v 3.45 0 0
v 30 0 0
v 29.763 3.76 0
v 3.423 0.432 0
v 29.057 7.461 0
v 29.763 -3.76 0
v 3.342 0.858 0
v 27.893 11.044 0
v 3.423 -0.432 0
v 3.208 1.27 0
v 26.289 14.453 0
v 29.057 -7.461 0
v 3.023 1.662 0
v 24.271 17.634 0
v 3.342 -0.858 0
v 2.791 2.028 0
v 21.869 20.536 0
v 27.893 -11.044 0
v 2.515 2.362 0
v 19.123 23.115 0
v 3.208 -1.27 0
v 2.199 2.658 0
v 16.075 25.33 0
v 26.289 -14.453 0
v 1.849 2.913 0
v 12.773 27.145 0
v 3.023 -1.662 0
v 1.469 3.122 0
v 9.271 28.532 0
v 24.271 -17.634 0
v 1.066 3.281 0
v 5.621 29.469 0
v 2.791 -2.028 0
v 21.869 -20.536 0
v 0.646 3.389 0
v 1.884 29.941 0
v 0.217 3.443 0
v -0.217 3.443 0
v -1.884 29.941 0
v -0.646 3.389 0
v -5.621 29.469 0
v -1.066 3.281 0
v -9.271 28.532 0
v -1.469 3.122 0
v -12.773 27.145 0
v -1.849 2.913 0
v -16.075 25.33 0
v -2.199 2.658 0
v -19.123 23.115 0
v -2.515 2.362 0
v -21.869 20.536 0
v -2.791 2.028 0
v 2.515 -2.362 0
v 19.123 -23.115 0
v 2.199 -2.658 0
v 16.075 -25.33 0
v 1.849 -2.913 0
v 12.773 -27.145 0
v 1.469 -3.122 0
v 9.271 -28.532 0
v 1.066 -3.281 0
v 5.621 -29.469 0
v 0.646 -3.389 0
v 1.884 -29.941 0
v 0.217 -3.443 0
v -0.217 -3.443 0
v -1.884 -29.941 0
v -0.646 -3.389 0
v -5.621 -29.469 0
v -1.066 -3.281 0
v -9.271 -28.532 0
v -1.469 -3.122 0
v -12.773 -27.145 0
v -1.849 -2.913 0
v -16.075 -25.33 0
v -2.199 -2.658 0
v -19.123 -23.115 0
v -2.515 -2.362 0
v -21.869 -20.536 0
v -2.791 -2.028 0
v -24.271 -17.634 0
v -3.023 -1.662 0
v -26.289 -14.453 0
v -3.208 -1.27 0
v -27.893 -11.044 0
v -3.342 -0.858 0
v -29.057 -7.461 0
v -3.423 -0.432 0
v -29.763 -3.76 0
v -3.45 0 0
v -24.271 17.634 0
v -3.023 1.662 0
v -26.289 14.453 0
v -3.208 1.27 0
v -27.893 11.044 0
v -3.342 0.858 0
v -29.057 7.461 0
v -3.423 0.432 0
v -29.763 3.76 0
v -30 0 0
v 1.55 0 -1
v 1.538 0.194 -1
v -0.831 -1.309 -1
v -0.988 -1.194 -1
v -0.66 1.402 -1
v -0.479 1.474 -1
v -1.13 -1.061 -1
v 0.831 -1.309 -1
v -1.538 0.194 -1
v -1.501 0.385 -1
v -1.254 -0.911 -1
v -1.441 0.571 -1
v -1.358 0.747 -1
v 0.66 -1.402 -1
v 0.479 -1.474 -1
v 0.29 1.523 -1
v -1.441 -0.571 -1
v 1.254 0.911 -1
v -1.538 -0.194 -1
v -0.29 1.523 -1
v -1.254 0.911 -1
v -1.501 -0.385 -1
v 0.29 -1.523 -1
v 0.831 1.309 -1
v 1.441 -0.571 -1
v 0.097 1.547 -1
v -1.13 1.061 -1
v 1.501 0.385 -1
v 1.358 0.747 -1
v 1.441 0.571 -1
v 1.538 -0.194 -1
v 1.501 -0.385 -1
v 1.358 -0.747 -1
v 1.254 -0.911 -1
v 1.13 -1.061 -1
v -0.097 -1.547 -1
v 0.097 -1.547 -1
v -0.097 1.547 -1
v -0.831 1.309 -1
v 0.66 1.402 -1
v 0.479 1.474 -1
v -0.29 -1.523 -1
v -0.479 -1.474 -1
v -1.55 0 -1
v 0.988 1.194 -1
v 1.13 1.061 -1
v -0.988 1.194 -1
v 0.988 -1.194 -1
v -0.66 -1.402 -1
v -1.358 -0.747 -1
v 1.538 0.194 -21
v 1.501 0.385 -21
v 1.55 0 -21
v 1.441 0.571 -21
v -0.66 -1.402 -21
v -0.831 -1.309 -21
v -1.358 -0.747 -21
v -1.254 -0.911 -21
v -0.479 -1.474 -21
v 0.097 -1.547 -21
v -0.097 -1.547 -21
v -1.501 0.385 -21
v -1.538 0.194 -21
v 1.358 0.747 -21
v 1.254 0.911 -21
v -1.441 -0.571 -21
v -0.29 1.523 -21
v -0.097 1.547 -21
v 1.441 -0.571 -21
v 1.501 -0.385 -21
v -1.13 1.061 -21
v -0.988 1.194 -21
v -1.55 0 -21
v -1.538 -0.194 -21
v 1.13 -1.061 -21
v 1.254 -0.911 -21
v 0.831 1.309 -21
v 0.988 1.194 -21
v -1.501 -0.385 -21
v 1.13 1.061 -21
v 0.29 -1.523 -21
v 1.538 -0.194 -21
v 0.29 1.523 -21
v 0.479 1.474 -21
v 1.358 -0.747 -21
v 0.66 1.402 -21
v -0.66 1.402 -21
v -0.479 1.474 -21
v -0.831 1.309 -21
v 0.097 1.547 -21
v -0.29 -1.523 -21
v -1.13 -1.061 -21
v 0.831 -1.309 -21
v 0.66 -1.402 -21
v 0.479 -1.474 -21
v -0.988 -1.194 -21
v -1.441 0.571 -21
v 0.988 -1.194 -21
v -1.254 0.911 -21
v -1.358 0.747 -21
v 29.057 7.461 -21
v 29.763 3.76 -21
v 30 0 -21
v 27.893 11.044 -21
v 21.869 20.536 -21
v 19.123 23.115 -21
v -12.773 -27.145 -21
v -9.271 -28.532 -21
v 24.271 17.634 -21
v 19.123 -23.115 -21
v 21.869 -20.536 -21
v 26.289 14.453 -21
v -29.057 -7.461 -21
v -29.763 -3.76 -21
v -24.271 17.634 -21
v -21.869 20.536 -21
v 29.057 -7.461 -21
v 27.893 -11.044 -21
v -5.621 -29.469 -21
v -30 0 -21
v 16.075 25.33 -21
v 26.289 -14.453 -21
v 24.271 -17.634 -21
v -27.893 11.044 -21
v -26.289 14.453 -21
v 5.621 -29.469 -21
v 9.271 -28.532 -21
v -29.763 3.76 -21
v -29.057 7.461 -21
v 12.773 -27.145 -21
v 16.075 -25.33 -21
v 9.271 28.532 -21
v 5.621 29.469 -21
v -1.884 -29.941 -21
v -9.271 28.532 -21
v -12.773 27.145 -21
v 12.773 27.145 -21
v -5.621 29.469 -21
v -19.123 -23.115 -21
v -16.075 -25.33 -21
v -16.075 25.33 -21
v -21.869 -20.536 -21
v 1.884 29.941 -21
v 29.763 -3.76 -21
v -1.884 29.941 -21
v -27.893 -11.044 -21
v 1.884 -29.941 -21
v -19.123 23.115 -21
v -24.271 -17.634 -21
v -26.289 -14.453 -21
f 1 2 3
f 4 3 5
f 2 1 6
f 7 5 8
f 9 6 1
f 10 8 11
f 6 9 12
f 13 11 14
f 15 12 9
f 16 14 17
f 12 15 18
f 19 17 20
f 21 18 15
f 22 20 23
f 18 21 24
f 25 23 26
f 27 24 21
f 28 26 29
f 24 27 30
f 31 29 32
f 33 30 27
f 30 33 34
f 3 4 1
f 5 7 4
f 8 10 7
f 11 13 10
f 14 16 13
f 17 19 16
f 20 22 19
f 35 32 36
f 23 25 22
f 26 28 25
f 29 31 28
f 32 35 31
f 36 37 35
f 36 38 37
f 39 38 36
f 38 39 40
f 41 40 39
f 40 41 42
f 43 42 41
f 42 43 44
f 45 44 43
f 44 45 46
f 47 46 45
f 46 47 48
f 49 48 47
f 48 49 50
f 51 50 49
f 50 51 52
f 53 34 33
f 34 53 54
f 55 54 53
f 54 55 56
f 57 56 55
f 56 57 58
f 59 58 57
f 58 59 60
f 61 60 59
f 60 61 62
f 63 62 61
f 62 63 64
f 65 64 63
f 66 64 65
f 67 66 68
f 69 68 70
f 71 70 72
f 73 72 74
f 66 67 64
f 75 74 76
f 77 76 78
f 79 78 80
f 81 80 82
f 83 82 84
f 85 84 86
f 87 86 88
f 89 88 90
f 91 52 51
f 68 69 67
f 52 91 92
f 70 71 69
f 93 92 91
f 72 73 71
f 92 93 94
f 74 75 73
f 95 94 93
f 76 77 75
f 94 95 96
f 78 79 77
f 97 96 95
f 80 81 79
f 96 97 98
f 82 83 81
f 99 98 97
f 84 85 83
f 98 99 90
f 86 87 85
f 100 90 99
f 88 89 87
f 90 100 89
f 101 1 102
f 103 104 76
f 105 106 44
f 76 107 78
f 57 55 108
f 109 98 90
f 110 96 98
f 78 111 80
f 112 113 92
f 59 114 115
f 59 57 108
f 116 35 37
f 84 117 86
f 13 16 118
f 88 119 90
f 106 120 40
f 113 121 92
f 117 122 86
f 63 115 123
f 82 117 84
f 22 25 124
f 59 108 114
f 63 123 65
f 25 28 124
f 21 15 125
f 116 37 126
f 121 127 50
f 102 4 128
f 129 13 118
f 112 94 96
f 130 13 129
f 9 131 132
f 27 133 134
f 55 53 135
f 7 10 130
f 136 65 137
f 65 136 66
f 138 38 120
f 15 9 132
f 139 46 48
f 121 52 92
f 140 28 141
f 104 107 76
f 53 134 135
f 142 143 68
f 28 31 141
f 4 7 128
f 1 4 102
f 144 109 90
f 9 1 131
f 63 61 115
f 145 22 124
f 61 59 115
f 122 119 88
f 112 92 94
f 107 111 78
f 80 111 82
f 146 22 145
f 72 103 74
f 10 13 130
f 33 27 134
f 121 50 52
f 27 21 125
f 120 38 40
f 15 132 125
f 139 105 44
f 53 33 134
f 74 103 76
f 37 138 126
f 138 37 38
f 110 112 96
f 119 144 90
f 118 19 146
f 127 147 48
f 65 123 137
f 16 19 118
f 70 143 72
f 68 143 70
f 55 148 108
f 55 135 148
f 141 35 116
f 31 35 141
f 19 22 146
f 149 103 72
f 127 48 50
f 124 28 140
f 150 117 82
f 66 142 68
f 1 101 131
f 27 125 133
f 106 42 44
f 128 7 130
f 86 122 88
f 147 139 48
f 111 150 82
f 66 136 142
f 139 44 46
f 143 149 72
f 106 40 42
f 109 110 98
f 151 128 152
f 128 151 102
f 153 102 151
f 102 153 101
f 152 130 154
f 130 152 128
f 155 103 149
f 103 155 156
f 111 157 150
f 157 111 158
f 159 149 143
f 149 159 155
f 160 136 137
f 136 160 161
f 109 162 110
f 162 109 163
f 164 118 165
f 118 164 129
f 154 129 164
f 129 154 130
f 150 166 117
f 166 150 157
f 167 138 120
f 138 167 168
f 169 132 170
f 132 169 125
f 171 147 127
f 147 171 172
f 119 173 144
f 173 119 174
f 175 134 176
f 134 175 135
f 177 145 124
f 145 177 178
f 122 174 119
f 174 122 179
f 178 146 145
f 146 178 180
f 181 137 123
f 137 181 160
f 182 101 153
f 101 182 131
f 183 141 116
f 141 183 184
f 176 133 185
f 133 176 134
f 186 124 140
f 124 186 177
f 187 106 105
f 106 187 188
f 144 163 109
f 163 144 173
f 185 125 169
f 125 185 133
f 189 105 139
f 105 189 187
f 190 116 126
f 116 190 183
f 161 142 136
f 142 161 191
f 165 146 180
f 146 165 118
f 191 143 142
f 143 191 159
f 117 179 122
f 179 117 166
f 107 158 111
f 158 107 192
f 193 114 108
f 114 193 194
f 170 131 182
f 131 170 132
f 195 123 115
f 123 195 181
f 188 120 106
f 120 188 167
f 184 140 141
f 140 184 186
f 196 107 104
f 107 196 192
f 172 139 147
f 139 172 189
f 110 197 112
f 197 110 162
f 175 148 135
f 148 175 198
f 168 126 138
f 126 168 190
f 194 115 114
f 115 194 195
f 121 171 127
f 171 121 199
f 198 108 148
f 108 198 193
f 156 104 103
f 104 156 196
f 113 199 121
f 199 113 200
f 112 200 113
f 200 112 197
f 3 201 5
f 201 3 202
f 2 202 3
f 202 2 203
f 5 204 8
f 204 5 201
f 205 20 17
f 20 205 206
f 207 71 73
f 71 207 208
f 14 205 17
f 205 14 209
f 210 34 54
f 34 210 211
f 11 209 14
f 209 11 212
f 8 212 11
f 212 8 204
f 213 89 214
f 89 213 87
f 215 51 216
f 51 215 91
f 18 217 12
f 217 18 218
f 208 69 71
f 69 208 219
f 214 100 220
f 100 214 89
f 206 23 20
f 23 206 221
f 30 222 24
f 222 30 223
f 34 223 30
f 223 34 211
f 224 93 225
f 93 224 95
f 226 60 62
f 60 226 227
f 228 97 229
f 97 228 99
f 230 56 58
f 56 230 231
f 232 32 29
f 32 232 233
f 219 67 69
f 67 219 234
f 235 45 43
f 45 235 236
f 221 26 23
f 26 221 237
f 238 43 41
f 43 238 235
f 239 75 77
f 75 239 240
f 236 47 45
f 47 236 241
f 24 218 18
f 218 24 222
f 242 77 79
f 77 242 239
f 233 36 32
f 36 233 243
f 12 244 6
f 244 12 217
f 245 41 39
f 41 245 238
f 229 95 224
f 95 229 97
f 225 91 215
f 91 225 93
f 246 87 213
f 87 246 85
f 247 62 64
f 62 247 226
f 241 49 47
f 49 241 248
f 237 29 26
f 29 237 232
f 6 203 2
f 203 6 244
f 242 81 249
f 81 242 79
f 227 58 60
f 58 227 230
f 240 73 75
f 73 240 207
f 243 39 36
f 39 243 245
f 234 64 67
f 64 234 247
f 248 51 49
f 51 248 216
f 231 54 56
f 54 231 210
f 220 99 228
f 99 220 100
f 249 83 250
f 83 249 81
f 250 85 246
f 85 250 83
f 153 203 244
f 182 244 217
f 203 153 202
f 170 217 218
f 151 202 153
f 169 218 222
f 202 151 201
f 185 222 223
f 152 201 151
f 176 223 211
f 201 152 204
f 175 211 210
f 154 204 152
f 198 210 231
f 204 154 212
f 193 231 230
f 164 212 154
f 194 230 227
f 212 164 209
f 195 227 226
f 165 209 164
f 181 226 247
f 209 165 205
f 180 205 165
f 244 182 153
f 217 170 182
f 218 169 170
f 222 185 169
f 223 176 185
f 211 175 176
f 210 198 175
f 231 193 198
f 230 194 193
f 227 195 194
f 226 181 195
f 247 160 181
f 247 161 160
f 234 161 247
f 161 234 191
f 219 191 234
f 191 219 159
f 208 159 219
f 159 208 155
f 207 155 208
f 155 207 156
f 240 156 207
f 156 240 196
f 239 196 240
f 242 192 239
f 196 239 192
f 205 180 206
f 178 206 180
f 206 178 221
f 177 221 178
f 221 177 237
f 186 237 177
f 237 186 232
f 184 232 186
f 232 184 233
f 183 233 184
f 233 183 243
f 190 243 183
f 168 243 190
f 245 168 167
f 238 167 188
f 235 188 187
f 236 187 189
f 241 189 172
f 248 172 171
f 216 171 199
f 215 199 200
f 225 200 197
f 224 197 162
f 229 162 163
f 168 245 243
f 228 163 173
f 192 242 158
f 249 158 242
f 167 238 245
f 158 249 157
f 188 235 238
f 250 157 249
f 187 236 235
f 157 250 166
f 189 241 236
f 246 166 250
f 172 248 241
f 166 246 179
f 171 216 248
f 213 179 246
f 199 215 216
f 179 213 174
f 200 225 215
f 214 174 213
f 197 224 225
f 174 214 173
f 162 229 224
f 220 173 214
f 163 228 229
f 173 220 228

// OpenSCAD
$fn = 50;

difference() {
	union() {
		translate(v = [0, 0, -21.0]) {
			cylinder(h = 21, r = 30.0);
		}
	}
	union() {
		translate(v = [0, 0, 0]) {
			rotate(a = [0, 0, 0]) {
				difference() {
					union() {
						translate(v = [0, 0, -24.0]) {
							cylinder(h = 24, r = 1.25);
						}
						translate(v = [0, 0, -1.0]) {
							cylinder(h = 1.0, r1 = 1.55, r2 = 3.45);
						}
						translate(v = [0, 0, -24.0]) {
							cylinder(h = 24, r = 1.55);
						}
						translate(v = [0, 0, -24.0]) {
							cylinder(h = 24, r = 1.25);
						}
					}
					union();
				}
			}
		}
	}
}
